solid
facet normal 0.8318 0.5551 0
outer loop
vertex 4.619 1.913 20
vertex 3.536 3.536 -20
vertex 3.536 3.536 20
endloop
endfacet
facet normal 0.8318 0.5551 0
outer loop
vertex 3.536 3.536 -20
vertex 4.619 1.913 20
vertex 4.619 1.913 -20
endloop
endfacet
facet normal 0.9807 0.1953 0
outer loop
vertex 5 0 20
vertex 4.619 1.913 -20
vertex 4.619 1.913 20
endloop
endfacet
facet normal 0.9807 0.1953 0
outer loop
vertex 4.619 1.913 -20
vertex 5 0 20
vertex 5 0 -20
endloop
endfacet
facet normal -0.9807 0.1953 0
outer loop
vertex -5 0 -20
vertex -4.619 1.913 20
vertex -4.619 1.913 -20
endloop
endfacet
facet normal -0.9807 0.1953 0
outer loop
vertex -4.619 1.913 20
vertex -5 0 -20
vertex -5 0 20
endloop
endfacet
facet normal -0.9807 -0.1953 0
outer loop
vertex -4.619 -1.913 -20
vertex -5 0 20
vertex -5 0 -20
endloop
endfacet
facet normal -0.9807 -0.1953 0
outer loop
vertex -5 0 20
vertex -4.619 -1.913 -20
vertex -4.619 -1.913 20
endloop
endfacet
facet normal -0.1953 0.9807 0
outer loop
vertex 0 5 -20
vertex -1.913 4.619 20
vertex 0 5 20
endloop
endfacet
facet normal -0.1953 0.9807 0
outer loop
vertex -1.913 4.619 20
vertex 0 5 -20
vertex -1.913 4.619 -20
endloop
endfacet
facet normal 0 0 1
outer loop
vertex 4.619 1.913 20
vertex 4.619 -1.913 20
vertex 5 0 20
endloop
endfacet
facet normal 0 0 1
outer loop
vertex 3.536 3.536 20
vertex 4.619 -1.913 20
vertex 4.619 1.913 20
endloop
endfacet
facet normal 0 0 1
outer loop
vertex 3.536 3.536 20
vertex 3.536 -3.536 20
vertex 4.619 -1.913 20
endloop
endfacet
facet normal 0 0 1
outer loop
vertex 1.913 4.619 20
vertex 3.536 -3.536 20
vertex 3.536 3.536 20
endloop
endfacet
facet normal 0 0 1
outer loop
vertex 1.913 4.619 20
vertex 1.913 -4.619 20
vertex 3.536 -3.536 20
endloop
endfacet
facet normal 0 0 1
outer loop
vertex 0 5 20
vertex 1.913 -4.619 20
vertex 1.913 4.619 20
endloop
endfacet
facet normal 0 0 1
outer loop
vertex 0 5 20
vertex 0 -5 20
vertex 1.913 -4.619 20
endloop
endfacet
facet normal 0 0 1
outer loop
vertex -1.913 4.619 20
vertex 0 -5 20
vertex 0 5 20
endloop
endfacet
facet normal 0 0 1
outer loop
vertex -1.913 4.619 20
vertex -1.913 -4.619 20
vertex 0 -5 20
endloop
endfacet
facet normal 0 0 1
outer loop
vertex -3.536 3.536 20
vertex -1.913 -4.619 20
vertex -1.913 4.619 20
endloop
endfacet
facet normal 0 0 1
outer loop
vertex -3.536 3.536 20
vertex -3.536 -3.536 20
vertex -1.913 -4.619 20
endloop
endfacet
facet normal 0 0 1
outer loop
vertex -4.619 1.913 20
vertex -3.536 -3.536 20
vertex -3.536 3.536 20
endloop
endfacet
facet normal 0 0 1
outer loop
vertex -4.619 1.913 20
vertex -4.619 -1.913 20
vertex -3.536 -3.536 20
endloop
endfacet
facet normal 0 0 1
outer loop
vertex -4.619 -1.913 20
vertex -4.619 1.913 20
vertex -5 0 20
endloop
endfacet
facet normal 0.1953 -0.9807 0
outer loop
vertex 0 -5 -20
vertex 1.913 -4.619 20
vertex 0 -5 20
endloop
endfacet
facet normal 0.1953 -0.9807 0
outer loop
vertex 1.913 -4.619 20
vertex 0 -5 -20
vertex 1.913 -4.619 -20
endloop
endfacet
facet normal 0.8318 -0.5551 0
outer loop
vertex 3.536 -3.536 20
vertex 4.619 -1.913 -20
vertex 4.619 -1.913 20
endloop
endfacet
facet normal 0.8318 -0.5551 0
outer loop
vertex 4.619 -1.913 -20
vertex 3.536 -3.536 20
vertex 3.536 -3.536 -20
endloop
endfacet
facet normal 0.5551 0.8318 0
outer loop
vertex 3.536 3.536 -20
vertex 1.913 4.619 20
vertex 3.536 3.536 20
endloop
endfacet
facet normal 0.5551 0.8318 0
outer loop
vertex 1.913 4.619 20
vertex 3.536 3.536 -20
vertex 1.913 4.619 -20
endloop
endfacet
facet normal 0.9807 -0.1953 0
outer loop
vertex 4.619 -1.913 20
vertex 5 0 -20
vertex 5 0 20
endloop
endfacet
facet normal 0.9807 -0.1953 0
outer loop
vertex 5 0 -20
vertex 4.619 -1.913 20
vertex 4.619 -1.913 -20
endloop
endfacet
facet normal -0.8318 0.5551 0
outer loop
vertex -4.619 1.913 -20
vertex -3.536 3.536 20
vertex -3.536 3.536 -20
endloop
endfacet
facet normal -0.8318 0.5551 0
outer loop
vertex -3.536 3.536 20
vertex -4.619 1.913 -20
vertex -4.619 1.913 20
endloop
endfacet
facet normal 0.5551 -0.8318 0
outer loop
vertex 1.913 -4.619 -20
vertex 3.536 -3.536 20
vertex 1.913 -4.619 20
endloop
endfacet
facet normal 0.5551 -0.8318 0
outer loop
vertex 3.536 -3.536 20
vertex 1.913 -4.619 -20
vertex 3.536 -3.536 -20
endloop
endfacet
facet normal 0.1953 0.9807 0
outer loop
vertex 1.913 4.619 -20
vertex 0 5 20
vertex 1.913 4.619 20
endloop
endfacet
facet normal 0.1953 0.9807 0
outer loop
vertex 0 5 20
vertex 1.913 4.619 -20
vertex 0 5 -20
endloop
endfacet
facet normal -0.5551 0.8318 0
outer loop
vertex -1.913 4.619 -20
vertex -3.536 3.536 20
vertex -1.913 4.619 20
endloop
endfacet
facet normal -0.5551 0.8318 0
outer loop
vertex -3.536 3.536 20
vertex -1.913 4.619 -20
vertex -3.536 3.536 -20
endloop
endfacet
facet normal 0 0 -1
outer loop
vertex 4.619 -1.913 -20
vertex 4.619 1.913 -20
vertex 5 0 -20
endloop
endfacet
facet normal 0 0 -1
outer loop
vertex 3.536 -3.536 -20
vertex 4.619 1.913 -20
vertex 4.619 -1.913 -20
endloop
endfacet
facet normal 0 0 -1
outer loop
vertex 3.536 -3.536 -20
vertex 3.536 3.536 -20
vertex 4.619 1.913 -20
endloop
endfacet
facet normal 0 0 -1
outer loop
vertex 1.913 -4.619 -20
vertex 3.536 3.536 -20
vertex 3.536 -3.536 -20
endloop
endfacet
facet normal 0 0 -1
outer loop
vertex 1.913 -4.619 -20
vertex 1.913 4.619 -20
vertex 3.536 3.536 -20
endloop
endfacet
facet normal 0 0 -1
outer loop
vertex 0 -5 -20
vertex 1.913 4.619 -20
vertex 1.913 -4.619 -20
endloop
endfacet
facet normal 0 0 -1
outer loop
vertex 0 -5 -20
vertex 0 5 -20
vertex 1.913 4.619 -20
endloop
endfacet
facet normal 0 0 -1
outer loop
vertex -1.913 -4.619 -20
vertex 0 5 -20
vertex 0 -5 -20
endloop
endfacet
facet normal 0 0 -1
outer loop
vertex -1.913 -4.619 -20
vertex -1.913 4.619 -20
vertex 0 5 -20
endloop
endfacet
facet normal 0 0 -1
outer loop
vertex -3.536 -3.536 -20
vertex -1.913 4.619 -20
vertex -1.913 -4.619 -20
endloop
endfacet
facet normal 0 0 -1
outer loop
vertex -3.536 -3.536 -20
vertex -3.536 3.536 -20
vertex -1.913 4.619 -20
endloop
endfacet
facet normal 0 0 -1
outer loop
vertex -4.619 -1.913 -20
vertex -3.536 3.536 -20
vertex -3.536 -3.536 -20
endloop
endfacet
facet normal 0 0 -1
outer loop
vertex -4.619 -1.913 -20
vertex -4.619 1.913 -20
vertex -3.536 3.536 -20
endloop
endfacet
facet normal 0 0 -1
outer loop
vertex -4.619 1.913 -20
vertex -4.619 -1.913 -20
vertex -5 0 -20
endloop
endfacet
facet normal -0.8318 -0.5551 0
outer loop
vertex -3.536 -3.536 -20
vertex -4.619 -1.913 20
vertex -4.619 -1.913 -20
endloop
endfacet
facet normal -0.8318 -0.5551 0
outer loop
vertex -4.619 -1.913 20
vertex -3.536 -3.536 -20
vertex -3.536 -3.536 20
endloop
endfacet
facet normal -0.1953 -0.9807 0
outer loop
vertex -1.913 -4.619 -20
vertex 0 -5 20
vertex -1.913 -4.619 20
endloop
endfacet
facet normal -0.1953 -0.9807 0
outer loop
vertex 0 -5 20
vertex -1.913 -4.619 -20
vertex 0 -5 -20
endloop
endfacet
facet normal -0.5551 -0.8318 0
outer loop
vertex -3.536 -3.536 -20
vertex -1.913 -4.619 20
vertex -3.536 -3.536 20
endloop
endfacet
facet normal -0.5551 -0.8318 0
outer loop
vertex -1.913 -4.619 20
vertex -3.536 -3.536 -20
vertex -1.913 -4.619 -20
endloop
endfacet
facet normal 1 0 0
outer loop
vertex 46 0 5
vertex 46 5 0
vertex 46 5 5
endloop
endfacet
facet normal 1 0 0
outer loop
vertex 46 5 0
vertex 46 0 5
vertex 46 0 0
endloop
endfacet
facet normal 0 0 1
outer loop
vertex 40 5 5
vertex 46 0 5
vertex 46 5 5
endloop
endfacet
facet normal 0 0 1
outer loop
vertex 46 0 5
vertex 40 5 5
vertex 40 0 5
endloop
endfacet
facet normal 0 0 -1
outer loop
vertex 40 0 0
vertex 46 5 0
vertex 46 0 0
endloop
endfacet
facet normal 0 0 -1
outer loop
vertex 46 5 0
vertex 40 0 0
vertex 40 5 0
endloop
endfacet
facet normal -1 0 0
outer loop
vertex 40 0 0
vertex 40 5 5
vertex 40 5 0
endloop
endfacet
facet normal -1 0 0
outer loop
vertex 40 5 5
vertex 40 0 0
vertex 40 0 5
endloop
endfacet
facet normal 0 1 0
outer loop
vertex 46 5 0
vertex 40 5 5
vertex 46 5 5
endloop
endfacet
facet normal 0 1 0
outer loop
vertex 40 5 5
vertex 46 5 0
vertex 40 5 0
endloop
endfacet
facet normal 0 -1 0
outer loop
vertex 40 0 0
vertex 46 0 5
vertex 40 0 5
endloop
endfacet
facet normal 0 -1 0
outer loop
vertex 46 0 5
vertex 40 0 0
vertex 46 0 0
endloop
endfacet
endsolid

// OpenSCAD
// A `%` node as the FIRST OPERAND of a difference — where the next operand is
// promoted to first and the difference subtracts nothing.
//
// 🔴 THIS CASE GUARDS THE HARNESS, NOT THE PRODUCT, AND THAT IS WHY IT EXISTS.
// `canon.mjs` used to build a background node into an EMPTY node and leave it in
// its parent's child list; `normalise`'s `diff` arm then read an empty FIRST
// operand and returned `<nothing>` ("nothing to cut away from"). So this file
// canonicalised to nothing on the ORACLE's side while the binary's own STL — and
// ours — is the cylinder at 3061.4675 mm³. The instrument would have scored a
// CORRECT result as `DIVERGES` and sent somebody to fix code that was right.
//
// WHAT OPENSCAD ACTUALLY DOES, read at the source rather than inferred:
// `GeometryEvaluator::collectChildren3D` opens with `if (chnode->modinst->
// isBackground()) continue;`, so the background child is REMOVED from the list
// the operator receives and the cylinder becomes operand zero;
// `applyToChildren3D` then takes its `children.size() == 1 -> this is a noop`
// early return. Measured at 2026.08.07: 60 facets of cylinder.
//
// ⚠ REMOVED IS NOT THE SAME AS EMPTY, AND THE DISTINCTION IS LOAD-BEARING. A
// first operand that is genuinely empty but NOT background still yields nothing
// (`manifold-applyops.cc`: `if (op == DIFFERENCE && !foundFirst) { geom =
// nullptr; break; }`), and so does a `%` wrapped in a transform, because the
// transform node is not itself background — it stays in the list and evaluates
// to nothing. Measured: `difference(){ translate([0,0,0]) %cube(20);
// cylinder(...); }` prints "Current top level object is empty". A fix that
// dropped any empty child would make that case wrong in the other direction, so
// the removal is a child-list edit at the immediate parent and nowhere else.
//
// The control solid at x=40 is the convention from `6425ea855e`: without it, a
// regression that refused the whole difference would emit nothing and score
// `REFUSED`, which `CAD1` treats as safe.
//
// Decidability: the cylinder is r=5 about the origin, the control solid starts
// at x=40. The bounding boxes cannot touch.
//
// PLANTED AND WATCHED RED (throwaway copy of `tools/scad_oracle/canon.mjs`,
// md5-verified against the live file before the edit; openscad 2026.08.07):
//   · background built into EMPTY and left in the child list -> DIVERGES
//     (this case only, over the full 81-case corpus: SAME 63->62, DIVERGES 4->5.
//     The row reads `TREE differs / MESH same` — the solids agree because ours
//     were right all along, which is the whole complaint)
difference() {
  %cube(20);
  cylinder(h = 40, r = 5, center = true, $fn = 16);
}
translate([40, 0, 0]) cube([6, 5, 5]);
